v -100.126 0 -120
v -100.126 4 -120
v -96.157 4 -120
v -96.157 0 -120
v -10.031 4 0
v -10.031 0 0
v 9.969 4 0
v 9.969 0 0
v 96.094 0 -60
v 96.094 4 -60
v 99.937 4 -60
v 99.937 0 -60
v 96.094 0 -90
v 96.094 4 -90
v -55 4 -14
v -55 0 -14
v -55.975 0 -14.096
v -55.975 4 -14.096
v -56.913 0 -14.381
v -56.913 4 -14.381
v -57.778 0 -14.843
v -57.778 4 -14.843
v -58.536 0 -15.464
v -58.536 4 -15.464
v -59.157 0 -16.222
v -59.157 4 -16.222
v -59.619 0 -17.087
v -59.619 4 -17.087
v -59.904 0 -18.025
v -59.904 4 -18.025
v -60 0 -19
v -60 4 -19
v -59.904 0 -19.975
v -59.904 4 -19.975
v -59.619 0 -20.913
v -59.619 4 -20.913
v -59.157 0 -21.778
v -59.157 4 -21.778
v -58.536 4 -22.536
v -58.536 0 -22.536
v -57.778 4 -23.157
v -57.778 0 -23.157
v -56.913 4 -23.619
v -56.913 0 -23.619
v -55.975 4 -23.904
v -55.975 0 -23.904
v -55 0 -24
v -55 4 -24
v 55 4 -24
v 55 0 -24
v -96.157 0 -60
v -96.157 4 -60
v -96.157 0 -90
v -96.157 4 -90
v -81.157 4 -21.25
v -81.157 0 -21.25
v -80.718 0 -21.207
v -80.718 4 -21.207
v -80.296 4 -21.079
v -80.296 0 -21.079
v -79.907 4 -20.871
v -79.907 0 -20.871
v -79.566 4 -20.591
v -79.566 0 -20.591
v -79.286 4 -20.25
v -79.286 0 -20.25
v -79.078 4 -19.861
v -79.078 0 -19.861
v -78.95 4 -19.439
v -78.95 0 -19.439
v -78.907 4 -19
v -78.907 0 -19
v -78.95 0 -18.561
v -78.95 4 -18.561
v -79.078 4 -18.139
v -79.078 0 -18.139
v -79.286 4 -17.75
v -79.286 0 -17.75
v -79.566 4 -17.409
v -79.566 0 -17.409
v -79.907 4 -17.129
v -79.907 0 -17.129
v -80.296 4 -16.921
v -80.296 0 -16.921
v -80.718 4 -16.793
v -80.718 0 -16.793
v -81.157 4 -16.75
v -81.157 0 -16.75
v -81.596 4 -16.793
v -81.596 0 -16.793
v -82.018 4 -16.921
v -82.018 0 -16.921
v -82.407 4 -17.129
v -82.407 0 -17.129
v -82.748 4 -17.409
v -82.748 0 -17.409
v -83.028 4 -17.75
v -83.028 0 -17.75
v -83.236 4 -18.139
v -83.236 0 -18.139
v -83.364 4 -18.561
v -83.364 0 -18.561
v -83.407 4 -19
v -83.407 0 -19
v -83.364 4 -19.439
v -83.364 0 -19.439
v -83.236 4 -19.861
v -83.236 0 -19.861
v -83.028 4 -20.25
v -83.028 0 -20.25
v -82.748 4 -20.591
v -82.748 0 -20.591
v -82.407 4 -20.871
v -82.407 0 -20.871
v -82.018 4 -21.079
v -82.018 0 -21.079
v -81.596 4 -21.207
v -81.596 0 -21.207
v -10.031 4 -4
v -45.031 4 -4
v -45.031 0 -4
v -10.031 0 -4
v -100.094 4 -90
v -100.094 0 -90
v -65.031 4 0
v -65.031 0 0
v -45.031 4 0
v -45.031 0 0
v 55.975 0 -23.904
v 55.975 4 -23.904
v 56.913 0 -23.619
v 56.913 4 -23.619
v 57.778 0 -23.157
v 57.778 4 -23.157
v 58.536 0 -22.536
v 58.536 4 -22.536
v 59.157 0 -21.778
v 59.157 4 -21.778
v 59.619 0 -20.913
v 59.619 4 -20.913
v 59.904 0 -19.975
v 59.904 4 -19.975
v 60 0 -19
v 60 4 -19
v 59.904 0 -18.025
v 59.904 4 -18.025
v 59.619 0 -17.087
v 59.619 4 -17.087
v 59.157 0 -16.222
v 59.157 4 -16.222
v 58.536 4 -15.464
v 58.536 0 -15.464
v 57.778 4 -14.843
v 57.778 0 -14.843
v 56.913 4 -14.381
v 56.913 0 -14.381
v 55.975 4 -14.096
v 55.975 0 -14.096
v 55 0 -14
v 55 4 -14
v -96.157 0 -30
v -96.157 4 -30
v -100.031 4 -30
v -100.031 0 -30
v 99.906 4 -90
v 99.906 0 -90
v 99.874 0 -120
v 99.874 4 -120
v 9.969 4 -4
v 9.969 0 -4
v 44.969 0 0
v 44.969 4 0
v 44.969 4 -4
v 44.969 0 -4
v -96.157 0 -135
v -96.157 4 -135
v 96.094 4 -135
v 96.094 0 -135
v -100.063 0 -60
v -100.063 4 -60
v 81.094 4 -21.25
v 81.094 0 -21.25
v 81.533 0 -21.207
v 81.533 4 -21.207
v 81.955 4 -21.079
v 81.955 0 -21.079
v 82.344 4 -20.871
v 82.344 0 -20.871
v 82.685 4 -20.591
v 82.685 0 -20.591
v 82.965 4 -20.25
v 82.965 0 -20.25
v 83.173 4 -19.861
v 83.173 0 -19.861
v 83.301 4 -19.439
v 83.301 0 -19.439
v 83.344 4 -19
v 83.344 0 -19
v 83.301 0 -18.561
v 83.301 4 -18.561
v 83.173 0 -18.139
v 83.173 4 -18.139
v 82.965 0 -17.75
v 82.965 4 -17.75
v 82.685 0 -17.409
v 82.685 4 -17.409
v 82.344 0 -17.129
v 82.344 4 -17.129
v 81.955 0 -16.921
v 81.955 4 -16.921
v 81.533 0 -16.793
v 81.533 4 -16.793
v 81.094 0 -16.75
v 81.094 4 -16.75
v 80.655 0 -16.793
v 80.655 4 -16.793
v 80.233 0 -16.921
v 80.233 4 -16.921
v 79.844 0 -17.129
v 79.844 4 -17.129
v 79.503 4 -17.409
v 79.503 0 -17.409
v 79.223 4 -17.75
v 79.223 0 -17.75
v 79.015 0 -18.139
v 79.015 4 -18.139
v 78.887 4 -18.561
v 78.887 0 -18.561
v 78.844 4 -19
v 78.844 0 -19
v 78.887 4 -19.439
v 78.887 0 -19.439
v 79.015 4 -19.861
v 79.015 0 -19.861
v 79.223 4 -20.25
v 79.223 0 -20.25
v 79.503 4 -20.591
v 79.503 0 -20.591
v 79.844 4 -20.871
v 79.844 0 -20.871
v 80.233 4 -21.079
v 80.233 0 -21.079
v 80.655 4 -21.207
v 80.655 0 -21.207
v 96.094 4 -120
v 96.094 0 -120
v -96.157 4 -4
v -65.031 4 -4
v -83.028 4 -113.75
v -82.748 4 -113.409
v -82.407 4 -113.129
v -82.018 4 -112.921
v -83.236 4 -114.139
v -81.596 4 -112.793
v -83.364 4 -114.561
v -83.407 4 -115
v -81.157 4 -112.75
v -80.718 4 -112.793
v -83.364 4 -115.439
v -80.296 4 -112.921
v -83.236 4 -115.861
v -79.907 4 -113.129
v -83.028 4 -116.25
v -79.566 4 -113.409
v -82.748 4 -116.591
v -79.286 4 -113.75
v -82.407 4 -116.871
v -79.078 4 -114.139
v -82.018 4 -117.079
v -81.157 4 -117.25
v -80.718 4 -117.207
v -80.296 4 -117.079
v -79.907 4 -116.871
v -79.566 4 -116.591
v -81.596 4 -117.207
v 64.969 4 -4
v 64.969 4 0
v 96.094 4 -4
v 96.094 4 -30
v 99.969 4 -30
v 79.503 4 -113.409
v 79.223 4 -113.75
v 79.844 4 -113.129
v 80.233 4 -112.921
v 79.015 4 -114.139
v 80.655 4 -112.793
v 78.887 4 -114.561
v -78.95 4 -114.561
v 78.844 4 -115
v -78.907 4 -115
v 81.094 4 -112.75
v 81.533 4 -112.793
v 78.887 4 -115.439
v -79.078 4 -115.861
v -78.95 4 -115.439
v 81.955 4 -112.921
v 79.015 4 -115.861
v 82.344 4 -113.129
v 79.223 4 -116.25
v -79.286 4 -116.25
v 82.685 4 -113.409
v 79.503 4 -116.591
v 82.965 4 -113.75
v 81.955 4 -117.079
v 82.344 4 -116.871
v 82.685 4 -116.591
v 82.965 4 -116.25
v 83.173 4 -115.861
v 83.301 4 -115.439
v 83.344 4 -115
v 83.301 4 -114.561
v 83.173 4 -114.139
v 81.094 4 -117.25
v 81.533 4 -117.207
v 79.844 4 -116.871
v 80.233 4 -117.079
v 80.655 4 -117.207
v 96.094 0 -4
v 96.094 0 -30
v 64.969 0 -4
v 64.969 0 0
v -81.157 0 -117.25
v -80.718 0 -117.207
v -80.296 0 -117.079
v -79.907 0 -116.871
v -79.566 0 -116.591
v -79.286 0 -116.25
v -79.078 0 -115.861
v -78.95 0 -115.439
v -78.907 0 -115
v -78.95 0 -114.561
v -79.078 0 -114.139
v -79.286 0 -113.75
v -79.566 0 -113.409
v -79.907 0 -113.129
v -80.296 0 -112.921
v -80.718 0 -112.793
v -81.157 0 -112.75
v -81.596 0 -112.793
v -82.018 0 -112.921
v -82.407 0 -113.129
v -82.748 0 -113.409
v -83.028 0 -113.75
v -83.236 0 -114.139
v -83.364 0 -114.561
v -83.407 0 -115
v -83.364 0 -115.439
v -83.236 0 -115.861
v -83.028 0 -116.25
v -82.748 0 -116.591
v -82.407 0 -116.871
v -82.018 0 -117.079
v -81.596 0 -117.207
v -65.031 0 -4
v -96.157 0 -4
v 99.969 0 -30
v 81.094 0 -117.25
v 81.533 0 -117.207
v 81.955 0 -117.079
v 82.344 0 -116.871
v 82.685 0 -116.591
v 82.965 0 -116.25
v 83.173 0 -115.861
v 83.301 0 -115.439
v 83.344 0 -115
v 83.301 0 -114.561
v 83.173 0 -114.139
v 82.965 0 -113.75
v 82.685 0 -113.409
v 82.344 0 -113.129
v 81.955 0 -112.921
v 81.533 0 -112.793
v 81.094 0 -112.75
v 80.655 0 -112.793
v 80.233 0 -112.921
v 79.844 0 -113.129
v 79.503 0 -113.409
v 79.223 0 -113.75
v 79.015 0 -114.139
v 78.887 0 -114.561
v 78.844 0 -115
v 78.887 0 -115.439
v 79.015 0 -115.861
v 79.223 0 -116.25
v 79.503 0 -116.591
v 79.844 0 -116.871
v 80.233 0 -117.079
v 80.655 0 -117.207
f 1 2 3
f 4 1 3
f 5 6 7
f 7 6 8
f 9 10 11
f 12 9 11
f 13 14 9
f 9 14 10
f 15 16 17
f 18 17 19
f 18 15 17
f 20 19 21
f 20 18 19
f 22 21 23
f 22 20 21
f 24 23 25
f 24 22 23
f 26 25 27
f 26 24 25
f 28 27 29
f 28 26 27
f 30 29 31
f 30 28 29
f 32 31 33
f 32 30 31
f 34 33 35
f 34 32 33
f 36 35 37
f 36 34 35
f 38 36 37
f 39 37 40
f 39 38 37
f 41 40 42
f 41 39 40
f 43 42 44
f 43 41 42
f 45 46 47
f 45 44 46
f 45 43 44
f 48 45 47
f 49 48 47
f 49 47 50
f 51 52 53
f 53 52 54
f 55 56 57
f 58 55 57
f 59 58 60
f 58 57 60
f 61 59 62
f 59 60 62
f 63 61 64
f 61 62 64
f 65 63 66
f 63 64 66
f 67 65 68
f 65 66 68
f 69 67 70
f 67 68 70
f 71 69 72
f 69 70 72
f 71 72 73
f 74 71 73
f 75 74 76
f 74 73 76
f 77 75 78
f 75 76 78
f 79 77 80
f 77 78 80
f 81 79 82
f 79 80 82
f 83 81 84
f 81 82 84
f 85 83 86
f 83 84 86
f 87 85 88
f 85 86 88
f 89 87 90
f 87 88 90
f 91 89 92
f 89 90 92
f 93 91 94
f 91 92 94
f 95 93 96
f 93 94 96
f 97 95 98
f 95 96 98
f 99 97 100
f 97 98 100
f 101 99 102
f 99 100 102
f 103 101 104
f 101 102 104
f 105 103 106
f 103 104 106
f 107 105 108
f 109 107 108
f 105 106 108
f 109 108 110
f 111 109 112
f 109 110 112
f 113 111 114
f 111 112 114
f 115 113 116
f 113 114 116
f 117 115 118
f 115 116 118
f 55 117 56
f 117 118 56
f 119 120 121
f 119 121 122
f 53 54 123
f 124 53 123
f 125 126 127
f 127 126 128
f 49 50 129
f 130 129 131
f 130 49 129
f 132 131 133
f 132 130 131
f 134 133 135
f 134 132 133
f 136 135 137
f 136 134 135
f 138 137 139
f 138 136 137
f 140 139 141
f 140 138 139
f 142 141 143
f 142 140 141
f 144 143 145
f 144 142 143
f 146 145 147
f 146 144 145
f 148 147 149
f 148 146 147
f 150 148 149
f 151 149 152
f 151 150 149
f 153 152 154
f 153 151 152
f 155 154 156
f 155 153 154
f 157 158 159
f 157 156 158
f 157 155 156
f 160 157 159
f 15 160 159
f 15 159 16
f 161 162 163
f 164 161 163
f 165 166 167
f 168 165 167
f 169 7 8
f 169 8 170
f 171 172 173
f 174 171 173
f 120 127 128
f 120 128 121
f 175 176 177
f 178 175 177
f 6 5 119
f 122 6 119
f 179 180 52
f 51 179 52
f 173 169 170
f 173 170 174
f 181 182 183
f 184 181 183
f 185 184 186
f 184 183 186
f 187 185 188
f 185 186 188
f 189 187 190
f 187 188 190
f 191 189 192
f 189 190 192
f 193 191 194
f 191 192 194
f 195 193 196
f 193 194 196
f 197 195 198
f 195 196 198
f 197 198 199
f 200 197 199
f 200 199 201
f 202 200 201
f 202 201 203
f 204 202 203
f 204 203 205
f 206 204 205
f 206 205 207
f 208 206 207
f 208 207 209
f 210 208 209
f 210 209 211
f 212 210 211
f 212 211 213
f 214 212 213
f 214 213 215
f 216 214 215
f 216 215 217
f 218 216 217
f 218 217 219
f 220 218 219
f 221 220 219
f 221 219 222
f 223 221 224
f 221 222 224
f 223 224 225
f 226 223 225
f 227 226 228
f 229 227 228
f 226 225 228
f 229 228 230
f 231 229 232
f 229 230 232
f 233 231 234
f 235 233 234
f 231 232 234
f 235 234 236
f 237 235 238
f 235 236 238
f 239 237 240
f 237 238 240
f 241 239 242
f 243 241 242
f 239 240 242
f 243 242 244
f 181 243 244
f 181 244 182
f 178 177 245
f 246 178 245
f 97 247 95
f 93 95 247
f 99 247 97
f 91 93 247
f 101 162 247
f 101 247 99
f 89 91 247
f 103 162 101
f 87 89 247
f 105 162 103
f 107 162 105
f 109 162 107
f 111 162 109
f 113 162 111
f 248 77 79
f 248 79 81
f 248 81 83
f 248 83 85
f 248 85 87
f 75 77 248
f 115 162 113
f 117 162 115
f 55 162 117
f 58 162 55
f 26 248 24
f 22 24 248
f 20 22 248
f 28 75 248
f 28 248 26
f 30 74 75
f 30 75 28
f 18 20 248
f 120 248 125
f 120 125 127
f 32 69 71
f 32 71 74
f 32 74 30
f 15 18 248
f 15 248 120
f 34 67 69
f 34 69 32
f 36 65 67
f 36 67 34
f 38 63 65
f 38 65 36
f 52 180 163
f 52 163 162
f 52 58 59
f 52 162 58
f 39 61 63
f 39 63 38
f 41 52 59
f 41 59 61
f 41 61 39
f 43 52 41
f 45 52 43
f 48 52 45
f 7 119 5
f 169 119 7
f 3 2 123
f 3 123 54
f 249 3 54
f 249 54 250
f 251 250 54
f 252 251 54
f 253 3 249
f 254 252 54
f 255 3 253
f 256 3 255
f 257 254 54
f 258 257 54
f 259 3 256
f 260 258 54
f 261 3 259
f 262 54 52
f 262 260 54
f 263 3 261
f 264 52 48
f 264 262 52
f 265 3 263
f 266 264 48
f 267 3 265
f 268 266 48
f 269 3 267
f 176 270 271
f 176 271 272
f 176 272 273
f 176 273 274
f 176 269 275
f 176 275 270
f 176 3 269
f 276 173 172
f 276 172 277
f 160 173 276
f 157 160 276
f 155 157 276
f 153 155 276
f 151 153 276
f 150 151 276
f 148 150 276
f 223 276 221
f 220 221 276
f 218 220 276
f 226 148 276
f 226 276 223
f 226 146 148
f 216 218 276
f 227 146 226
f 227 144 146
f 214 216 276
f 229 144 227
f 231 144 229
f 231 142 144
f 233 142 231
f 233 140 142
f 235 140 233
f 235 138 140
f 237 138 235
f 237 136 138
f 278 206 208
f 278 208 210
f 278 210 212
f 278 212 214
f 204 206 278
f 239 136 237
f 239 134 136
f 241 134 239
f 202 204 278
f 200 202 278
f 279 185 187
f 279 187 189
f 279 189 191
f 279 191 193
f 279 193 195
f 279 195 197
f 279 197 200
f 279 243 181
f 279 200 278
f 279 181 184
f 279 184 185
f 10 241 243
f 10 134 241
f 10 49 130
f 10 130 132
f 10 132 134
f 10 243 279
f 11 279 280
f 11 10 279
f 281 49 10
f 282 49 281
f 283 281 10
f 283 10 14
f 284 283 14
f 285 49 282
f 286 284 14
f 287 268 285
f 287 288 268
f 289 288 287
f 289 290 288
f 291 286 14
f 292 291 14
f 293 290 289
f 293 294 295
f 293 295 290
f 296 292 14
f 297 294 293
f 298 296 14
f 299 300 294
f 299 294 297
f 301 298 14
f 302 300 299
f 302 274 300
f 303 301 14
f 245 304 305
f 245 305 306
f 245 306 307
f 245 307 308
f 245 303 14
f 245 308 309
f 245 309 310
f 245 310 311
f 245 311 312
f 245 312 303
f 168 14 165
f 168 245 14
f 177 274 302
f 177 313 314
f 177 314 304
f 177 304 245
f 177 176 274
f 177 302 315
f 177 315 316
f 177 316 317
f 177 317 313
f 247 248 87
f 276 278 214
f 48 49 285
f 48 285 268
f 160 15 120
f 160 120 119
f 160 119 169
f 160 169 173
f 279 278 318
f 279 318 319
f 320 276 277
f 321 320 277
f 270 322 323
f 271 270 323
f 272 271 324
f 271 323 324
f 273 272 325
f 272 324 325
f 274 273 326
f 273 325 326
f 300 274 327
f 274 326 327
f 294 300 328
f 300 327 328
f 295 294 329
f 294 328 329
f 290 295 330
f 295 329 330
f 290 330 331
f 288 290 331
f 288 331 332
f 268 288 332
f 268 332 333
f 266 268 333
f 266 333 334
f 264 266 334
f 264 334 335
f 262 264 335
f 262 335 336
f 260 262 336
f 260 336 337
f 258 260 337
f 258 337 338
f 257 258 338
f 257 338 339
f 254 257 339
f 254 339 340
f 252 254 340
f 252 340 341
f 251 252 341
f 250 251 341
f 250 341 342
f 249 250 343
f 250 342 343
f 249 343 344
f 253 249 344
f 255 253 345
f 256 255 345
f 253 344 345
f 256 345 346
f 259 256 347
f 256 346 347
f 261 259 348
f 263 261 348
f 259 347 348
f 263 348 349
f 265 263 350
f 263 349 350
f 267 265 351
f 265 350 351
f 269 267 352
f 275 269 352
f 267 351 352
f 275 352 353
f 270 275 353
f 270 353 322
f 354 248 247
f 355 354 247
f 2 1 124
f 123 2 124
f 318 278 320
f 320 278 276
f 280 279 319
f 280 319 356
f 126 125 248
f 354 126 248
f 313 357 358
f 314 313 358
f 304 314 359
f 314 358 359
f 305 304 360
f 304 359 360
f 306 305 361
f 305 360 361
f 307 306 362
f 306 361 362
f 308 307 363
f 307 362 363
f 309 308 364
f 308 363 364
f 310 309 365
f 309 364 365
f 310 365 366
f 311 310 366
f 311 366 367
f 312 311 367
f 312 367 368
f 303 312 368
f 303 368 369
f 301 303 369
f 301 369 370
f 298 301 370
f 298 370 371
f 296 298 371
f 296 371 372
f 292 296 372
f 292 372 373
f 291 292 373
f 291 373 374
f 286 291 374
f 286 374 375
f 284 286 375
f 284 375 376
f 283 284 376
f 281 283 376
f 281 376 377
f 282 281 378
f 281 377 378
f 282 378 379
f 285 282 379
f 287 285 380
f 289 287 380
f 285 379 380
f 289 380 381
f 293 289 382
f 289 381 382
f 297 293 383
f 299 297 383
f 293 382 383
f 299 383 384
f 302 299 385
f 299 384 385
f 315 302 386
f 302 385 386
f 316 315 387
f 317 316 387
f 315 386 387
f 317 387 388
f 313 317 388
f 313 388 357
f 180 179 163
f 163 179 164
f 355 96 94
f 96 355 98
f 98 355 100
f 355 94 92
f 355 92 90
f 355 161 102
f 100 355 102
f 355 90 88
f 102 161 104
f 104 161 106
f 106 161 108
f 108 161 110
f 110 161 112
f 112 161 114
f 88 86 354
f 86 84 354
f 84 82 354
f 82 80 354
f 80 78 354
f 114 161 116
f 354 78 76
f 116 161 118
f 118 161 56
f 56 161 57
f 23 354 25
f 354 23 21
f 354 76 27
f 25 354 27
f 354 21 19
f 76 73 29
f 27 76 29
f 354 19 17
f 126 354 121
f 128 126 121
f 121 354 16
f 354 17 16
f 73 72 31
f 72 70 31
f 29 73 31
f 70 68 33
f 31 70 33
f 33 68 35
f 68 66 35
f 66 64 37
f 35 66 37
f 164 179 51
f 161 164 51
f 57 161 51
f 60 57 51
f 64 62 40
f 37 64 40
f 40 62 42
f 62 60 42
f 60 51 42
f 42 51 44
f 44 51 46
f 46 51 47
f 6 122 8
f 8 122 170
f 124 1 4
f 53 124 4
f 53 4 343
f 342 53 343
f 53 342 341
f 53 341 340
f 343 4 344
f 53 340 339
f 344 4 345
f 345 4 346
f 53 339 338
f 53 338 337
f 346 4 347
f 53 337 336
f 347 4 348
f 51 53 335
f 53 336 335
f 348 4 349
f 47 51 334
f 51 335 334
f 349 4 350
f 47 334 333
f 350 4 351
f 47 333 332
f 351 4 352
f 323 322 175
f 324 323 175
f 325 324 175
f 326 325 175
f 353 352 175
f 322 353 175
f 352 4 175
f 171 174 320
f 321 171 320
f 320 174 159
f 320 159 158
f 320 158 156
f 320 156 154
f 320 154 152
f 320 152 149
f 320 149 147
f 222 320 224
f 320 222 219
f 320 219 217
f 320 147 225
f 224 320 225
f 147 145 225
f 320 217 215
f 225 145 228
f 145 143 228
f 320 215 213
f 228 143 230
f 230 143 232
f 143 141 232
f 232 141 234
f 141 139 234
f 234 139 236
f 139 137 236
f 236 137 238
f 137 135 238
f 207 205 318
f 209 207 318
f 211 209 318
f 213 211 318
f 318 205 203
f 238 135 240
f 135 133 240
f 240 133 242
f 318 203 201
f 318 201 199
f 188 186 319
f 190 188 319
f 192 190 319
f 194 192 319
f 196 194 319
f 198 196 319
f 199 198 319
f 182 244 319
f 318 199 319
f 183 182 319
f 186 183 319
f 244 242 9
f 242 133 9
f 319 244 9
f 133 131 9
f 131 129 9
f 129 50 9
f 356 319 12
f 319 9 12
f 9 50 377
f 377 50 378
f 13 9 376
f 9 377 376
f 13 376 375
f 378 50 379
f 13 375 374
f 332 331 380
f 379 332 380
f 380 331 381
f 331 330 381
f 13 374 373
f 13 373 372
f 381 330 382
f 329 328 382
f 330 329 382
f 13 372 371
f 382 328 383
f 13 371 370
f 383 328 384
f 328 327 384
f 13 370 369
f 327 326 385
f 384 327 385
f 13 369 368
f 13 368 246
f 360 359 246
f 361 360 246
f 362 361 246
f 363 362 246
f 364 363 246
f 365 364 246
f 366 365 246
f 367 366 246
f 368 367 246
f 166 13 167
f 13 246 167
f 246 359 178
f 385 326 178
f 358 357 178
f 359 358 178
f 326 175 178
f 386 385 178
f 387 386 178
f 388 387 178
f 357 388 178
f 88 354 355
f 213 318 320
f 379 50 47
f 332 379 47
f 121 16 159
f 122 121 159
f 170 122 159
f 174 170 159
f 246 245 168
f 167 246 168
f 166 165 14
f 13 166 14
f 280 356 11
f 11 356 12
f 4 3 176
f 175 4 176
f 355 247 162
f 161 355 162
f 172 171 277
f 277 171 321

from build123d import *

# Parameters (mm, degrees)
RESSALTO_EXTRUS_O1_DEPTH = 4
ESBO_O2_W                = 35
ESBO_O2_H                = 4
ESBO_O2_W_2              = 3.874378487
ESBO_O2_H_2              = 26.000016438
CORTE_EXTRUS_O1_DEPTH    = 5
CORTE_EXTRUS_O5_REACH    = 6
ESBO_O6_W                = 32.376232368
ESBO_O6_H                = 43.313616366
ESBO_O3_W                = 192.251243026
ESBO_O3_H                = 15
CORTE_EXTRUS_O3_DEPTH    = 5
FURO_COM_FOLGA_DE_M41_D  = 4.5
ESBO_O5_R                = 2.25
CORTE_EXTRUS_O4_DEPTH    = 5


with BuildPart() as part:
    # Esboço1 → Ressalto-extrusão1 (new body)
    with BuildSketch(Plane(origin=(0, 0, 0), x_dir=(1, 0, 0), z_dir=(0, 1, 0))):
        Polygon((-100.157081707, 150), (-100.000054794, 0), (100.000054794, 0), (99.843027881, 150), align=None)
    extrude(amount=RESSALTO_EXTRUS_O1_DEPTH)

    # Esboço2 → Corte-extrusão1 (cut, through all)
    with BuildSketch(Plane(origin=(0, 4, 0), x_dir=(1, 0, 0), z_dir=(0, 1, 0))):
        Polygon((-100.125676325, 120), (-96.157081707, 120), (-96.157081707, 150), (-100.157081707, 150), align=None)
        Polygon((-100.062865577, 60.000016438), (-96.157081707, 60.000016438), (-96.157081707, 90), (-100.094270942, 90), align=None)
        Polygon((-100.004242179, 4), (-96.157081707, 4), (-96.157081707, 30.000016438), (-100.031460194, 30.000016438), align=None)
        Polygon((-100.000054794, 0), (-65.031460194, 0), (-65.031460194, 4), (-96.157081707, 4), (-100.004242179, 4), align=None)
        with Locations((-27.531460194, 2)):
            Rectangle(ESBO_O2_W, ESBO_O2_H)
        with Locations((27.468539806, 2)):
            Rectangle(ESBO_O2_W, ESBO_O2_H)
        Polygon((64.968539806, 4), (64.968539806, 0), (99.968539806, 0), (99.968539806, 4), (96.094161319, 4), align=None)
        with Locations((98.031350563, 17.000008219)):
            Rectangle(ESBO_O2_W_2, ESBO_O2_H_2)
        Polygon((96.094161319, 60.000016438), (99.937244012, 60.000016438), (99.905838646, 90), (96.094161319, 90), align=None)
        Polygon((99.843027881, 150), (96.094161319, 150), (96.094161319, 120), (99.874433264, 120), align=None)
    extrude(amount=-CORTE_EXTRUS_O1_DEPTH, mode=Mode.SUBTRACT)

    # Esboço6 → Corte-extrusão5 (cut, up to next)
    with BuildSketch(Plane(origin=(0, 4, 0), x_dir=(1, 0, 0), z_dir=(0, 1, 0)), mode=Mode.PRIVATE) as corte_extrus_o5_sk1:
        with Locations((112.282277503, 8.343208255)):
            Rectangle(ESBO_O6_W, ESBO_O6_H)
    corte_extrus_o5_tool1 = extrude(corte_extrus_o5_sk1.sketch, amount=-CORTE_EXTRUS_O5_REACH, mode=Mode.PRIVATE) & part.part
    add(corte_extrus_o5_tool1.solids().sort_by_distance((112.282278, 4, -8.343208))[0], mode=Mode.SUBTRACT)

    # Esboço3 → Corte-extrusão3 (cut, through all)
    with BuildSketch(Plane(origin=(0, 4, 0), x_dir=(1, 0, 0), z_dir=(0, 1, 0))):
        with Locations((-0.031460194, 142.5)):
            Rectangle(ESBO_O3_W, ESBO_O3_H)
    extrude(amount=-CORTE_EXTRUS_O3_DEPTH, mode=Mode.SUBTRACT)

    # Furo com folga de M41 (through all)
    with Locations(Plane(origin=(-81.157081707, 4, -19), x_dir=(0, 0, 1), z_dir=(0, 1, 0))):
        with Locations((0, 0), (-96, 0), (-96, 162.251243026), (0, 162.251243026)):
            Hole(FURO_COM_FOLGA_DE_M41_D / 2)

    # Esboço5 → Corte-extrusão4 (cut, through all)
    with BuildSketch(Plane(origin=(0, 4, 0), x_dir=(1, 0, 0), z_dir=(0, 1, 0))):
        with Locations((-81.157081707, 19)):
            Circle(ESBO_O5_R)
        with BuildLine():
            Line((-55, 24), (55, 24))
            ThreePointArc((55, 24), (60, 19), (55, 14))
            Line((55, 14), (-55, 14))
            ThreePointArc((-55, 14), (-60, 19), (-55, 24))
        make_face()
    extrude(amount=-CORTE_EXTRUS_O4_DEPTH, mode=Mode.SUBTRACT)


solid = part.part
